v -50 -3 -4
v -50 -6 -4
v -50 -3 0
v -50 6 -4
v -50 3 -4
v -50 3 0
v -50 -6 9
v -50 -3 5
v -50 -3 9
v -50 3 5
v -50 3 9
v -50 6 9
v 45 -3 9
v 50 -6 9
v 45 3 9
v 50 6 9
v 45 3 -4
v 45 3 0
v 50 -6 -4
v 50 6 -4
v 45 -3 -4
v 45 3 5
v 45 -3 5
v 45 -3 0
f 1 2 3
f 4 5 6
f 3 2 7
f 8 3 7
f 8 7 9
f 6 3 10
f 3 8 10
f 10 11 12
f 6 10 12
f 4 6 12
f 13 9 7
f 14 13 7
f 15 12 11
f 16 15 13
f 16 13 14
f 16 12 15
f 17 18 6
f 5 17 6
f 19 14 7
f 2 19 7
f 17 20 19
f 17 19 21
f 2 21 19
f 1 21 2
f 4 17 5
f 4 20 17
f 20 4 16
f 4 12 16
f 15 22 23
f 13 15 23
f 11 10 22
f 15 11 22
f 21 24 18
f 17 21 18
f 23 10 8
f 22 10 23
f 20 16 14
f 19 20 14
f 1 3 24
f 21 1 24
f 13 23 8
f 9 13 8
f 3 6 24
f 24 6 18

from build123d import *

# Parameters (mm, degrees)
ESQUISSE1_W        = 100
ESQUISSE1_H        = 12
BOSS_EXTRU_1_DEPTH = 5
BOSS_EXTRU_2_DEPTH = 4
BOSS_EXTRU_3_DEPTH = 4


with BuildPart() as part:
    # Esquisse1 → Boss.-Extru.1 (new body)
    with BuildSketch(Plane.XY):
        Rectangle(ESQUISSE1_W, ESQUISSE1_H)
    extrude(amount=BOSS_EXTRU_1_DEPTH)

    # Esquisse2 → Boss.-Extru.2 (add)
    with BuildSketch(Plane.XY.offset(5)):
        Polygon((-50, 3), (45, 3), (45, -3), (-50, -3), (-50, -6), (50, -6), (50, 6), (-50, 6), align=None)
    extrude(amount=BOSS_EXTRU_2_DEPTH)

    # Esquisse3 → Boss.-Extru.3 (add)
    with BuildSketch(Plane(origin=(0, 0, 0), x_dir=(-1, 0, 0), z_dir=(0, 0, -1))):
        Polygon((-50, -6), (50, -6), (50, -3), (-45, -3), (-45, 3), (50, 3), (50, 6), (-50, 6), align=None)
    extrude(amount=BOSS_EXTRU_3_DEPTH)


solid = part.part
